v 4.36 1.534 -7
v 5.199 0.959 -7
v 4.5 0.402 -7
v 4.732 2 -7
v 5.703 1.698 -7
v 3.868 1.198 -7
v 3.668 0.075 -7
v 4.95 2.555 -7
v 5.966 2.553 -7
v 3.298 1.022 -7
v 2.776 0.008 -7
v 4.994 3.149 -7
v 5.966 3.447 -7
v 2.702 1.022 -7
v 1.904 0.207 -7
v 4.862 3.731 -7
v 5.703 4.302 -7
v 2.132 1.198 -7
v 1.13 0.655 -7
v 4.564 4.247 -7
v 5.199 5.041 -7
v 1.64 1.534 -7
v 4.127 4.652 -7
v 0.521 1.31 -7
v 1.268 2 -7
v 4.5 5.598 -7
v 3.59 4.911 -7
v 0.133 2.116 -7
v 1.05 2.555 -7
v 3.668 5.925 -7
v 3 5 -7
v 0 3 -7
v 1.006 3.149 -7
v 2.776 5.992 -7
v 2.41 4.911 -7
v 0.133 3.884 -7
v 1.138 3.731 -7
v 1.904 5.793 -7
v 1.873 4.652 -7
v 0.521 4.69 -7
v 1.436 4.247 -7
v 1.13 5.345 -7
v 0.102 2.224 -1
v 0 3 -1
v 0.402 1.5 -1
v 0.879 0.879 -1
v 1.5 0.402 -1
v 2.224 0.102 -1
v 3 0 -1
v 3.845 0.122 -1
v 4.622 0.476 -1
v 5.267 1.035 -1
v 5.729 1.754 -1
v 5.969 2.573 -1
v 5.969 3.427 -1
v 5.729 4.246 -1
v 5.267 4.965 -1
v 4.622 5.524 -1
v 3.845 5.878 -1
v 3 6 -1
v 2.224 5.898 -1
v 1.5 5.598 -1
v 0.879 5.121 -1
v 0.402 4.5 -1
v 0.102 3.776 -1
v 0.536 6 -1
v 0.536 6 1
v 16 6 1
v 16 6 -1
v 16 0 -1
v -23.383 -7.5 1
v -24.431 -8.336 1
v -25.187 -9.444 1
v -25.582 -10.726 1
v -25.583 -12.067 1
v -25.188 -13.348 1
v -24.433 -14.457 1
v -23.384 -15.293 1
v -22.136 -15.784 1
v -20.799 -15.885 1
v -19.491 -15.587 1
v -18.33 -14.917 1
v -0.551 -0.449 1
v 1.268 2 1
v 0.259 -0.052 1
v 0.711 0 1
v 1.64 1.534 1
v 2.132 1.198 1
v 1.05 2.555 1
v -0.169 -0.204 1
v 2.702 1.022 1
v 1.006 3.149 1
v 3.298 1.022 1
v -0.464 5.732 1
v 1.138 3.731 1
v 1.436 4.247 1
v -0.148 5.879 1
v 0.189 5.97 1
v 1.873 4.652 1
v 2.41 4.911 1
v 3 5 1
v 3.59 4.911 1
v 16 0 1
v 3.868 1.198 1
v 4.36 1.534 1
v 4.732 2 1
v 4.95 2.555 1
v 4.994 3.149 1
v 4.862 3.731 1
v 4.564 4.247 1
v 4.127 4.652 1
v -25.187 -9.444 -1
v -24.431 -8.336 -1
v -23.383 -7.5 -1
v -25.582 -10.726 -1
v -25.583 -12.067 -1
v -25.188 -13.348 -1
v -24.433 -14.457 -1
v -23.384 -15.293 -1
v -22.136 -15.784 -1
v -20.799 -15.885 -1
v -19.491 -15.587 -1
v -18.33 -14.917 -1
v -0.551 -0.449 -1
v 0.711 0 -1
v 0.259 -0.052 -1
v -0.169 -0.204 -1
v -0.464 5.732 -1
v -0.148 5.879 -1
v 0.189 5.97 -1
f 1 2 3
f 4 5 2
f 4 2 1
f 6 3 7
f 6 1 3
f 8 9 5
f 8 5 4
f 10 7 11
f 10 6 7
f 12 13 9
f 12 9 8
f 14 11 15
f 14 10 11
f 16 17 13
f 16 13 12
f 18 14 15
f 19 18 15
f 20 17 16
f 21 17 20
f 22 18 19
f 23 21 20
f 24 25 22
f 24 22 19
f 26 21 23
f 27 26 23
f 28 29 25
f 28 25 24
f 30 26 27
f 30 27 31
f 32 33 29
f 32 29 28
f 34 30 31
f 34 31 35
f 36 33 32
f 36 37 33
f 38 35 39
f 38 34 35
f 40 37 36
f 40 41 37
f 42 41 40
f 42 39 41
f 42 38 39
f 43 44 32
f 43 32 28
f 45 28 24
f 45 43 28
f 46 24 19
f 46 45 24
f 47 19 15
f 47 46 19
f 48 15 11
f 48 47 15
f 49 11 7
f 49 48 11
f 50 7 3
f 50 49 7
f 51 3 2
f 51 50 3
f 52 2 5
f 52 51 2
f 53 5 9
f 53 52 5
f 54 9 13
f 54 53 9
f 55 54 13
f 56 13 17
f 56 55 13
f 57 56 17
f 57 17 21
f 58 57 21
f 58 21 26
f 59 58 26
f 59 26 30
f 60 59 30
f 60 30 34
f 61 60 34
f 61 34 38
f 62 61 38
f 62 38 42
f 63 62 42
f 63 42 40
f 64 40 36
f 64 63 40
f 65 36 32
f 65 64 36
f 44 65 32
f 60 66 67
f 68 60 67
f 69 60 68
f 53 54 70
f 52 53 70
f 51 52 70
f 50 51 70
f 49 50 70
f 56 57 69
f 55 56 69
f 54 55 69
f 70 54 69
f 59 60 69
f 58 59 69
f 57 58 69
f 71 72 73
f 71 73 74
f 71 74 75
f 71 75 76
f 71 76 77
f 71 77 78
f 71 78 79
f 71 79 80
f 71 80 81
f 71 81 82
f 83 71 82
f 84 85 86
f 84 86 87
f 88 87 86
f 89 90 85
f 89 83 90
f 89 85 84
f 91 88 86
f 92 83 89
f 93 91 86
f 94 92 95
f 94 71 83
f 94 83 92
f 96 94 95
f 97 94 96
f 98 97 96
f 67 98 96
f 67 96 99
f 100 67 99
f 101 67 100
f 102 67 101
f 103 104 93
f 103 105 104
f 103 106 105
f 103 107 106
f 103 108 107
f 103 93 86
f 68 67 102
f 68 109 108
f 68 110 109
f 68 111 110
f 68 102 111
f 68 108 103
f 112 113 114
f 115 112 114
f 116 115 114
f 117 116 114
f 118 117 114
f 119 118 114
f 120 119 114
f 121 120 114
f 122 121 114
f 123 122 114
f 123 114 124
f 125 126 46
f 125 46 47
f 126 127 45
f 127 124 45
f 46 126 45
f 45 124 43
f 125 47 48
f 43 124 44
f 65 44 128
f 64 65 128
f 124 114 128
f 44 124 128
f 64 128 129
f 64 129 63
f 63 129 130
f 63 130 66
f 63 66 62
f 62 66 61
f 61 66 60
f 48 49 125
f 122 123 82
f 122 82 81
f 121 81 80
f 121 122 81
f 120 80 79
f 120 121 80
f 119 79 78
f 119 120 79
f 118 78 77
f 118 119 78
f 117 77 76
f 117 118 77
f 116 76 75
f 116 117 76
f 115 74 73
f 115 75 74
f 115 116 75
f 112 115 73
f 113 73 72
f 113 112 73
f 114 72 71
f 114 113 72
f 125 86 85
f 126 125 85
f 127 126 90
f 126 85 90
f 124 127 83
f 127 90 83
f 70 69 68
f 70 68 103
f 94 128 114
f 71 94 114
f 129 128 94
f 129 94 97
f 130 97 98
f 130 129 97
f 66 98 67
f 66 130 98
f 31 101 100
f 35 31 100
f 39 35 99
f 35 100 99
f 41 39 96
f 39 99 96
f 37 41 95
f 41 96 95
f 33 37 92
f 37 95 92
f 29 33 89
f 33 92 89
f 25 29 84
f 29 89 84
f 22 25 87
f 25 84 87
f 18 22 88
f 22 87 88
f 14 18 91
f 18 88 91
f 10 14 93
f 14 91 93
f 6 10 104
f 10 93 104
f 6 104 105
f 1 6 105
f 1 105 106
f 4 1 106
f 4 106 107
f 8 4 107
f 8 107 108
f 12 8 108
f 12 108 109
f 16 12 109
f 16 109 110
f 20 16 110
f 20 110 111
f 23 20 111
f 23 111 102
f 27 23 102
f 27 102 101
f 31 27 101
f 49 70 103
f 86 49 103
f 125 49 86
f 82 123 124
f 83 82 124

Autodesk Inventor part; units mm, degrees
ref_plane "YZ Plane" through (0, 0, 0) normal (1, 0, 0) x (0, 1, 0)
ref_plane "XZ Plane" through (0, 0, 0) normal (0, 1, 0) x (-1, 0, 0)
ref_plane "XY Plane" through (0, 0, 0) normal (0, 0, 1) x (1, 0, 0)
sketch "Skizze1" plane through (0, 0, 0) normal (0, 0, 1) x (1, 0, 0)
  line L0 (0, 0) -> (0, 6)
  line L1 (0, 6) -> (-23.3827, -7.5)
  arc A0 (-23.3827, -7.5) -> (-18.3295, -14.9173) centre (-21.1327, -11.3971) ccw
  line L2 (-18.3295, -14.9173) -> (0, 0)
  line L3 (0, 6) -> (16, 6)
  line L4 (16, 6) -> (16, 0)
  line L5 (16, 0) -> (0, 0)
  line L6 (-21.1327, -11.3971) -> (0, 3) construction
  dimension "d1" = 6
  dimension "d3" = 30
  dimension "d4" = 4.5
  dimension "d5" = 16
  dimension "d6" = 27
extrude "Extrusion1" add sketch "Skizze1" along normal mid plane 2
sketch "Skizze2" plane through (0, 0, -1) normal (0, 0, -1) x (-1, 0, 0)
  circle A0 centre (-3, 3) radius 3
  line L0 (-16, 6) -> (-16, 0) projected
  point P0 (0, 0)
  point P1 (-16, 3)
  dimension "d9" = 6
  dimension "d10" = 13
extrude "Extrusion2" add sketch "Skizze2" along normal blind 6
sketch "Skizze3" plane through (3, 3, -7) normal (0, 0, -1) x (-1, 0, 0)
  circle A0 centre (0, 0) radius 3 projected
  point P0 (3, -3)
hole "Bohrung1" at (3, 3, -7) direction (0, 0, 1) diameter 4 depth 8
fillet "Rundung1" radius 2 2 edges at (0, 6, 0) (0, 0, 0)
properties part number "1 part 12"
